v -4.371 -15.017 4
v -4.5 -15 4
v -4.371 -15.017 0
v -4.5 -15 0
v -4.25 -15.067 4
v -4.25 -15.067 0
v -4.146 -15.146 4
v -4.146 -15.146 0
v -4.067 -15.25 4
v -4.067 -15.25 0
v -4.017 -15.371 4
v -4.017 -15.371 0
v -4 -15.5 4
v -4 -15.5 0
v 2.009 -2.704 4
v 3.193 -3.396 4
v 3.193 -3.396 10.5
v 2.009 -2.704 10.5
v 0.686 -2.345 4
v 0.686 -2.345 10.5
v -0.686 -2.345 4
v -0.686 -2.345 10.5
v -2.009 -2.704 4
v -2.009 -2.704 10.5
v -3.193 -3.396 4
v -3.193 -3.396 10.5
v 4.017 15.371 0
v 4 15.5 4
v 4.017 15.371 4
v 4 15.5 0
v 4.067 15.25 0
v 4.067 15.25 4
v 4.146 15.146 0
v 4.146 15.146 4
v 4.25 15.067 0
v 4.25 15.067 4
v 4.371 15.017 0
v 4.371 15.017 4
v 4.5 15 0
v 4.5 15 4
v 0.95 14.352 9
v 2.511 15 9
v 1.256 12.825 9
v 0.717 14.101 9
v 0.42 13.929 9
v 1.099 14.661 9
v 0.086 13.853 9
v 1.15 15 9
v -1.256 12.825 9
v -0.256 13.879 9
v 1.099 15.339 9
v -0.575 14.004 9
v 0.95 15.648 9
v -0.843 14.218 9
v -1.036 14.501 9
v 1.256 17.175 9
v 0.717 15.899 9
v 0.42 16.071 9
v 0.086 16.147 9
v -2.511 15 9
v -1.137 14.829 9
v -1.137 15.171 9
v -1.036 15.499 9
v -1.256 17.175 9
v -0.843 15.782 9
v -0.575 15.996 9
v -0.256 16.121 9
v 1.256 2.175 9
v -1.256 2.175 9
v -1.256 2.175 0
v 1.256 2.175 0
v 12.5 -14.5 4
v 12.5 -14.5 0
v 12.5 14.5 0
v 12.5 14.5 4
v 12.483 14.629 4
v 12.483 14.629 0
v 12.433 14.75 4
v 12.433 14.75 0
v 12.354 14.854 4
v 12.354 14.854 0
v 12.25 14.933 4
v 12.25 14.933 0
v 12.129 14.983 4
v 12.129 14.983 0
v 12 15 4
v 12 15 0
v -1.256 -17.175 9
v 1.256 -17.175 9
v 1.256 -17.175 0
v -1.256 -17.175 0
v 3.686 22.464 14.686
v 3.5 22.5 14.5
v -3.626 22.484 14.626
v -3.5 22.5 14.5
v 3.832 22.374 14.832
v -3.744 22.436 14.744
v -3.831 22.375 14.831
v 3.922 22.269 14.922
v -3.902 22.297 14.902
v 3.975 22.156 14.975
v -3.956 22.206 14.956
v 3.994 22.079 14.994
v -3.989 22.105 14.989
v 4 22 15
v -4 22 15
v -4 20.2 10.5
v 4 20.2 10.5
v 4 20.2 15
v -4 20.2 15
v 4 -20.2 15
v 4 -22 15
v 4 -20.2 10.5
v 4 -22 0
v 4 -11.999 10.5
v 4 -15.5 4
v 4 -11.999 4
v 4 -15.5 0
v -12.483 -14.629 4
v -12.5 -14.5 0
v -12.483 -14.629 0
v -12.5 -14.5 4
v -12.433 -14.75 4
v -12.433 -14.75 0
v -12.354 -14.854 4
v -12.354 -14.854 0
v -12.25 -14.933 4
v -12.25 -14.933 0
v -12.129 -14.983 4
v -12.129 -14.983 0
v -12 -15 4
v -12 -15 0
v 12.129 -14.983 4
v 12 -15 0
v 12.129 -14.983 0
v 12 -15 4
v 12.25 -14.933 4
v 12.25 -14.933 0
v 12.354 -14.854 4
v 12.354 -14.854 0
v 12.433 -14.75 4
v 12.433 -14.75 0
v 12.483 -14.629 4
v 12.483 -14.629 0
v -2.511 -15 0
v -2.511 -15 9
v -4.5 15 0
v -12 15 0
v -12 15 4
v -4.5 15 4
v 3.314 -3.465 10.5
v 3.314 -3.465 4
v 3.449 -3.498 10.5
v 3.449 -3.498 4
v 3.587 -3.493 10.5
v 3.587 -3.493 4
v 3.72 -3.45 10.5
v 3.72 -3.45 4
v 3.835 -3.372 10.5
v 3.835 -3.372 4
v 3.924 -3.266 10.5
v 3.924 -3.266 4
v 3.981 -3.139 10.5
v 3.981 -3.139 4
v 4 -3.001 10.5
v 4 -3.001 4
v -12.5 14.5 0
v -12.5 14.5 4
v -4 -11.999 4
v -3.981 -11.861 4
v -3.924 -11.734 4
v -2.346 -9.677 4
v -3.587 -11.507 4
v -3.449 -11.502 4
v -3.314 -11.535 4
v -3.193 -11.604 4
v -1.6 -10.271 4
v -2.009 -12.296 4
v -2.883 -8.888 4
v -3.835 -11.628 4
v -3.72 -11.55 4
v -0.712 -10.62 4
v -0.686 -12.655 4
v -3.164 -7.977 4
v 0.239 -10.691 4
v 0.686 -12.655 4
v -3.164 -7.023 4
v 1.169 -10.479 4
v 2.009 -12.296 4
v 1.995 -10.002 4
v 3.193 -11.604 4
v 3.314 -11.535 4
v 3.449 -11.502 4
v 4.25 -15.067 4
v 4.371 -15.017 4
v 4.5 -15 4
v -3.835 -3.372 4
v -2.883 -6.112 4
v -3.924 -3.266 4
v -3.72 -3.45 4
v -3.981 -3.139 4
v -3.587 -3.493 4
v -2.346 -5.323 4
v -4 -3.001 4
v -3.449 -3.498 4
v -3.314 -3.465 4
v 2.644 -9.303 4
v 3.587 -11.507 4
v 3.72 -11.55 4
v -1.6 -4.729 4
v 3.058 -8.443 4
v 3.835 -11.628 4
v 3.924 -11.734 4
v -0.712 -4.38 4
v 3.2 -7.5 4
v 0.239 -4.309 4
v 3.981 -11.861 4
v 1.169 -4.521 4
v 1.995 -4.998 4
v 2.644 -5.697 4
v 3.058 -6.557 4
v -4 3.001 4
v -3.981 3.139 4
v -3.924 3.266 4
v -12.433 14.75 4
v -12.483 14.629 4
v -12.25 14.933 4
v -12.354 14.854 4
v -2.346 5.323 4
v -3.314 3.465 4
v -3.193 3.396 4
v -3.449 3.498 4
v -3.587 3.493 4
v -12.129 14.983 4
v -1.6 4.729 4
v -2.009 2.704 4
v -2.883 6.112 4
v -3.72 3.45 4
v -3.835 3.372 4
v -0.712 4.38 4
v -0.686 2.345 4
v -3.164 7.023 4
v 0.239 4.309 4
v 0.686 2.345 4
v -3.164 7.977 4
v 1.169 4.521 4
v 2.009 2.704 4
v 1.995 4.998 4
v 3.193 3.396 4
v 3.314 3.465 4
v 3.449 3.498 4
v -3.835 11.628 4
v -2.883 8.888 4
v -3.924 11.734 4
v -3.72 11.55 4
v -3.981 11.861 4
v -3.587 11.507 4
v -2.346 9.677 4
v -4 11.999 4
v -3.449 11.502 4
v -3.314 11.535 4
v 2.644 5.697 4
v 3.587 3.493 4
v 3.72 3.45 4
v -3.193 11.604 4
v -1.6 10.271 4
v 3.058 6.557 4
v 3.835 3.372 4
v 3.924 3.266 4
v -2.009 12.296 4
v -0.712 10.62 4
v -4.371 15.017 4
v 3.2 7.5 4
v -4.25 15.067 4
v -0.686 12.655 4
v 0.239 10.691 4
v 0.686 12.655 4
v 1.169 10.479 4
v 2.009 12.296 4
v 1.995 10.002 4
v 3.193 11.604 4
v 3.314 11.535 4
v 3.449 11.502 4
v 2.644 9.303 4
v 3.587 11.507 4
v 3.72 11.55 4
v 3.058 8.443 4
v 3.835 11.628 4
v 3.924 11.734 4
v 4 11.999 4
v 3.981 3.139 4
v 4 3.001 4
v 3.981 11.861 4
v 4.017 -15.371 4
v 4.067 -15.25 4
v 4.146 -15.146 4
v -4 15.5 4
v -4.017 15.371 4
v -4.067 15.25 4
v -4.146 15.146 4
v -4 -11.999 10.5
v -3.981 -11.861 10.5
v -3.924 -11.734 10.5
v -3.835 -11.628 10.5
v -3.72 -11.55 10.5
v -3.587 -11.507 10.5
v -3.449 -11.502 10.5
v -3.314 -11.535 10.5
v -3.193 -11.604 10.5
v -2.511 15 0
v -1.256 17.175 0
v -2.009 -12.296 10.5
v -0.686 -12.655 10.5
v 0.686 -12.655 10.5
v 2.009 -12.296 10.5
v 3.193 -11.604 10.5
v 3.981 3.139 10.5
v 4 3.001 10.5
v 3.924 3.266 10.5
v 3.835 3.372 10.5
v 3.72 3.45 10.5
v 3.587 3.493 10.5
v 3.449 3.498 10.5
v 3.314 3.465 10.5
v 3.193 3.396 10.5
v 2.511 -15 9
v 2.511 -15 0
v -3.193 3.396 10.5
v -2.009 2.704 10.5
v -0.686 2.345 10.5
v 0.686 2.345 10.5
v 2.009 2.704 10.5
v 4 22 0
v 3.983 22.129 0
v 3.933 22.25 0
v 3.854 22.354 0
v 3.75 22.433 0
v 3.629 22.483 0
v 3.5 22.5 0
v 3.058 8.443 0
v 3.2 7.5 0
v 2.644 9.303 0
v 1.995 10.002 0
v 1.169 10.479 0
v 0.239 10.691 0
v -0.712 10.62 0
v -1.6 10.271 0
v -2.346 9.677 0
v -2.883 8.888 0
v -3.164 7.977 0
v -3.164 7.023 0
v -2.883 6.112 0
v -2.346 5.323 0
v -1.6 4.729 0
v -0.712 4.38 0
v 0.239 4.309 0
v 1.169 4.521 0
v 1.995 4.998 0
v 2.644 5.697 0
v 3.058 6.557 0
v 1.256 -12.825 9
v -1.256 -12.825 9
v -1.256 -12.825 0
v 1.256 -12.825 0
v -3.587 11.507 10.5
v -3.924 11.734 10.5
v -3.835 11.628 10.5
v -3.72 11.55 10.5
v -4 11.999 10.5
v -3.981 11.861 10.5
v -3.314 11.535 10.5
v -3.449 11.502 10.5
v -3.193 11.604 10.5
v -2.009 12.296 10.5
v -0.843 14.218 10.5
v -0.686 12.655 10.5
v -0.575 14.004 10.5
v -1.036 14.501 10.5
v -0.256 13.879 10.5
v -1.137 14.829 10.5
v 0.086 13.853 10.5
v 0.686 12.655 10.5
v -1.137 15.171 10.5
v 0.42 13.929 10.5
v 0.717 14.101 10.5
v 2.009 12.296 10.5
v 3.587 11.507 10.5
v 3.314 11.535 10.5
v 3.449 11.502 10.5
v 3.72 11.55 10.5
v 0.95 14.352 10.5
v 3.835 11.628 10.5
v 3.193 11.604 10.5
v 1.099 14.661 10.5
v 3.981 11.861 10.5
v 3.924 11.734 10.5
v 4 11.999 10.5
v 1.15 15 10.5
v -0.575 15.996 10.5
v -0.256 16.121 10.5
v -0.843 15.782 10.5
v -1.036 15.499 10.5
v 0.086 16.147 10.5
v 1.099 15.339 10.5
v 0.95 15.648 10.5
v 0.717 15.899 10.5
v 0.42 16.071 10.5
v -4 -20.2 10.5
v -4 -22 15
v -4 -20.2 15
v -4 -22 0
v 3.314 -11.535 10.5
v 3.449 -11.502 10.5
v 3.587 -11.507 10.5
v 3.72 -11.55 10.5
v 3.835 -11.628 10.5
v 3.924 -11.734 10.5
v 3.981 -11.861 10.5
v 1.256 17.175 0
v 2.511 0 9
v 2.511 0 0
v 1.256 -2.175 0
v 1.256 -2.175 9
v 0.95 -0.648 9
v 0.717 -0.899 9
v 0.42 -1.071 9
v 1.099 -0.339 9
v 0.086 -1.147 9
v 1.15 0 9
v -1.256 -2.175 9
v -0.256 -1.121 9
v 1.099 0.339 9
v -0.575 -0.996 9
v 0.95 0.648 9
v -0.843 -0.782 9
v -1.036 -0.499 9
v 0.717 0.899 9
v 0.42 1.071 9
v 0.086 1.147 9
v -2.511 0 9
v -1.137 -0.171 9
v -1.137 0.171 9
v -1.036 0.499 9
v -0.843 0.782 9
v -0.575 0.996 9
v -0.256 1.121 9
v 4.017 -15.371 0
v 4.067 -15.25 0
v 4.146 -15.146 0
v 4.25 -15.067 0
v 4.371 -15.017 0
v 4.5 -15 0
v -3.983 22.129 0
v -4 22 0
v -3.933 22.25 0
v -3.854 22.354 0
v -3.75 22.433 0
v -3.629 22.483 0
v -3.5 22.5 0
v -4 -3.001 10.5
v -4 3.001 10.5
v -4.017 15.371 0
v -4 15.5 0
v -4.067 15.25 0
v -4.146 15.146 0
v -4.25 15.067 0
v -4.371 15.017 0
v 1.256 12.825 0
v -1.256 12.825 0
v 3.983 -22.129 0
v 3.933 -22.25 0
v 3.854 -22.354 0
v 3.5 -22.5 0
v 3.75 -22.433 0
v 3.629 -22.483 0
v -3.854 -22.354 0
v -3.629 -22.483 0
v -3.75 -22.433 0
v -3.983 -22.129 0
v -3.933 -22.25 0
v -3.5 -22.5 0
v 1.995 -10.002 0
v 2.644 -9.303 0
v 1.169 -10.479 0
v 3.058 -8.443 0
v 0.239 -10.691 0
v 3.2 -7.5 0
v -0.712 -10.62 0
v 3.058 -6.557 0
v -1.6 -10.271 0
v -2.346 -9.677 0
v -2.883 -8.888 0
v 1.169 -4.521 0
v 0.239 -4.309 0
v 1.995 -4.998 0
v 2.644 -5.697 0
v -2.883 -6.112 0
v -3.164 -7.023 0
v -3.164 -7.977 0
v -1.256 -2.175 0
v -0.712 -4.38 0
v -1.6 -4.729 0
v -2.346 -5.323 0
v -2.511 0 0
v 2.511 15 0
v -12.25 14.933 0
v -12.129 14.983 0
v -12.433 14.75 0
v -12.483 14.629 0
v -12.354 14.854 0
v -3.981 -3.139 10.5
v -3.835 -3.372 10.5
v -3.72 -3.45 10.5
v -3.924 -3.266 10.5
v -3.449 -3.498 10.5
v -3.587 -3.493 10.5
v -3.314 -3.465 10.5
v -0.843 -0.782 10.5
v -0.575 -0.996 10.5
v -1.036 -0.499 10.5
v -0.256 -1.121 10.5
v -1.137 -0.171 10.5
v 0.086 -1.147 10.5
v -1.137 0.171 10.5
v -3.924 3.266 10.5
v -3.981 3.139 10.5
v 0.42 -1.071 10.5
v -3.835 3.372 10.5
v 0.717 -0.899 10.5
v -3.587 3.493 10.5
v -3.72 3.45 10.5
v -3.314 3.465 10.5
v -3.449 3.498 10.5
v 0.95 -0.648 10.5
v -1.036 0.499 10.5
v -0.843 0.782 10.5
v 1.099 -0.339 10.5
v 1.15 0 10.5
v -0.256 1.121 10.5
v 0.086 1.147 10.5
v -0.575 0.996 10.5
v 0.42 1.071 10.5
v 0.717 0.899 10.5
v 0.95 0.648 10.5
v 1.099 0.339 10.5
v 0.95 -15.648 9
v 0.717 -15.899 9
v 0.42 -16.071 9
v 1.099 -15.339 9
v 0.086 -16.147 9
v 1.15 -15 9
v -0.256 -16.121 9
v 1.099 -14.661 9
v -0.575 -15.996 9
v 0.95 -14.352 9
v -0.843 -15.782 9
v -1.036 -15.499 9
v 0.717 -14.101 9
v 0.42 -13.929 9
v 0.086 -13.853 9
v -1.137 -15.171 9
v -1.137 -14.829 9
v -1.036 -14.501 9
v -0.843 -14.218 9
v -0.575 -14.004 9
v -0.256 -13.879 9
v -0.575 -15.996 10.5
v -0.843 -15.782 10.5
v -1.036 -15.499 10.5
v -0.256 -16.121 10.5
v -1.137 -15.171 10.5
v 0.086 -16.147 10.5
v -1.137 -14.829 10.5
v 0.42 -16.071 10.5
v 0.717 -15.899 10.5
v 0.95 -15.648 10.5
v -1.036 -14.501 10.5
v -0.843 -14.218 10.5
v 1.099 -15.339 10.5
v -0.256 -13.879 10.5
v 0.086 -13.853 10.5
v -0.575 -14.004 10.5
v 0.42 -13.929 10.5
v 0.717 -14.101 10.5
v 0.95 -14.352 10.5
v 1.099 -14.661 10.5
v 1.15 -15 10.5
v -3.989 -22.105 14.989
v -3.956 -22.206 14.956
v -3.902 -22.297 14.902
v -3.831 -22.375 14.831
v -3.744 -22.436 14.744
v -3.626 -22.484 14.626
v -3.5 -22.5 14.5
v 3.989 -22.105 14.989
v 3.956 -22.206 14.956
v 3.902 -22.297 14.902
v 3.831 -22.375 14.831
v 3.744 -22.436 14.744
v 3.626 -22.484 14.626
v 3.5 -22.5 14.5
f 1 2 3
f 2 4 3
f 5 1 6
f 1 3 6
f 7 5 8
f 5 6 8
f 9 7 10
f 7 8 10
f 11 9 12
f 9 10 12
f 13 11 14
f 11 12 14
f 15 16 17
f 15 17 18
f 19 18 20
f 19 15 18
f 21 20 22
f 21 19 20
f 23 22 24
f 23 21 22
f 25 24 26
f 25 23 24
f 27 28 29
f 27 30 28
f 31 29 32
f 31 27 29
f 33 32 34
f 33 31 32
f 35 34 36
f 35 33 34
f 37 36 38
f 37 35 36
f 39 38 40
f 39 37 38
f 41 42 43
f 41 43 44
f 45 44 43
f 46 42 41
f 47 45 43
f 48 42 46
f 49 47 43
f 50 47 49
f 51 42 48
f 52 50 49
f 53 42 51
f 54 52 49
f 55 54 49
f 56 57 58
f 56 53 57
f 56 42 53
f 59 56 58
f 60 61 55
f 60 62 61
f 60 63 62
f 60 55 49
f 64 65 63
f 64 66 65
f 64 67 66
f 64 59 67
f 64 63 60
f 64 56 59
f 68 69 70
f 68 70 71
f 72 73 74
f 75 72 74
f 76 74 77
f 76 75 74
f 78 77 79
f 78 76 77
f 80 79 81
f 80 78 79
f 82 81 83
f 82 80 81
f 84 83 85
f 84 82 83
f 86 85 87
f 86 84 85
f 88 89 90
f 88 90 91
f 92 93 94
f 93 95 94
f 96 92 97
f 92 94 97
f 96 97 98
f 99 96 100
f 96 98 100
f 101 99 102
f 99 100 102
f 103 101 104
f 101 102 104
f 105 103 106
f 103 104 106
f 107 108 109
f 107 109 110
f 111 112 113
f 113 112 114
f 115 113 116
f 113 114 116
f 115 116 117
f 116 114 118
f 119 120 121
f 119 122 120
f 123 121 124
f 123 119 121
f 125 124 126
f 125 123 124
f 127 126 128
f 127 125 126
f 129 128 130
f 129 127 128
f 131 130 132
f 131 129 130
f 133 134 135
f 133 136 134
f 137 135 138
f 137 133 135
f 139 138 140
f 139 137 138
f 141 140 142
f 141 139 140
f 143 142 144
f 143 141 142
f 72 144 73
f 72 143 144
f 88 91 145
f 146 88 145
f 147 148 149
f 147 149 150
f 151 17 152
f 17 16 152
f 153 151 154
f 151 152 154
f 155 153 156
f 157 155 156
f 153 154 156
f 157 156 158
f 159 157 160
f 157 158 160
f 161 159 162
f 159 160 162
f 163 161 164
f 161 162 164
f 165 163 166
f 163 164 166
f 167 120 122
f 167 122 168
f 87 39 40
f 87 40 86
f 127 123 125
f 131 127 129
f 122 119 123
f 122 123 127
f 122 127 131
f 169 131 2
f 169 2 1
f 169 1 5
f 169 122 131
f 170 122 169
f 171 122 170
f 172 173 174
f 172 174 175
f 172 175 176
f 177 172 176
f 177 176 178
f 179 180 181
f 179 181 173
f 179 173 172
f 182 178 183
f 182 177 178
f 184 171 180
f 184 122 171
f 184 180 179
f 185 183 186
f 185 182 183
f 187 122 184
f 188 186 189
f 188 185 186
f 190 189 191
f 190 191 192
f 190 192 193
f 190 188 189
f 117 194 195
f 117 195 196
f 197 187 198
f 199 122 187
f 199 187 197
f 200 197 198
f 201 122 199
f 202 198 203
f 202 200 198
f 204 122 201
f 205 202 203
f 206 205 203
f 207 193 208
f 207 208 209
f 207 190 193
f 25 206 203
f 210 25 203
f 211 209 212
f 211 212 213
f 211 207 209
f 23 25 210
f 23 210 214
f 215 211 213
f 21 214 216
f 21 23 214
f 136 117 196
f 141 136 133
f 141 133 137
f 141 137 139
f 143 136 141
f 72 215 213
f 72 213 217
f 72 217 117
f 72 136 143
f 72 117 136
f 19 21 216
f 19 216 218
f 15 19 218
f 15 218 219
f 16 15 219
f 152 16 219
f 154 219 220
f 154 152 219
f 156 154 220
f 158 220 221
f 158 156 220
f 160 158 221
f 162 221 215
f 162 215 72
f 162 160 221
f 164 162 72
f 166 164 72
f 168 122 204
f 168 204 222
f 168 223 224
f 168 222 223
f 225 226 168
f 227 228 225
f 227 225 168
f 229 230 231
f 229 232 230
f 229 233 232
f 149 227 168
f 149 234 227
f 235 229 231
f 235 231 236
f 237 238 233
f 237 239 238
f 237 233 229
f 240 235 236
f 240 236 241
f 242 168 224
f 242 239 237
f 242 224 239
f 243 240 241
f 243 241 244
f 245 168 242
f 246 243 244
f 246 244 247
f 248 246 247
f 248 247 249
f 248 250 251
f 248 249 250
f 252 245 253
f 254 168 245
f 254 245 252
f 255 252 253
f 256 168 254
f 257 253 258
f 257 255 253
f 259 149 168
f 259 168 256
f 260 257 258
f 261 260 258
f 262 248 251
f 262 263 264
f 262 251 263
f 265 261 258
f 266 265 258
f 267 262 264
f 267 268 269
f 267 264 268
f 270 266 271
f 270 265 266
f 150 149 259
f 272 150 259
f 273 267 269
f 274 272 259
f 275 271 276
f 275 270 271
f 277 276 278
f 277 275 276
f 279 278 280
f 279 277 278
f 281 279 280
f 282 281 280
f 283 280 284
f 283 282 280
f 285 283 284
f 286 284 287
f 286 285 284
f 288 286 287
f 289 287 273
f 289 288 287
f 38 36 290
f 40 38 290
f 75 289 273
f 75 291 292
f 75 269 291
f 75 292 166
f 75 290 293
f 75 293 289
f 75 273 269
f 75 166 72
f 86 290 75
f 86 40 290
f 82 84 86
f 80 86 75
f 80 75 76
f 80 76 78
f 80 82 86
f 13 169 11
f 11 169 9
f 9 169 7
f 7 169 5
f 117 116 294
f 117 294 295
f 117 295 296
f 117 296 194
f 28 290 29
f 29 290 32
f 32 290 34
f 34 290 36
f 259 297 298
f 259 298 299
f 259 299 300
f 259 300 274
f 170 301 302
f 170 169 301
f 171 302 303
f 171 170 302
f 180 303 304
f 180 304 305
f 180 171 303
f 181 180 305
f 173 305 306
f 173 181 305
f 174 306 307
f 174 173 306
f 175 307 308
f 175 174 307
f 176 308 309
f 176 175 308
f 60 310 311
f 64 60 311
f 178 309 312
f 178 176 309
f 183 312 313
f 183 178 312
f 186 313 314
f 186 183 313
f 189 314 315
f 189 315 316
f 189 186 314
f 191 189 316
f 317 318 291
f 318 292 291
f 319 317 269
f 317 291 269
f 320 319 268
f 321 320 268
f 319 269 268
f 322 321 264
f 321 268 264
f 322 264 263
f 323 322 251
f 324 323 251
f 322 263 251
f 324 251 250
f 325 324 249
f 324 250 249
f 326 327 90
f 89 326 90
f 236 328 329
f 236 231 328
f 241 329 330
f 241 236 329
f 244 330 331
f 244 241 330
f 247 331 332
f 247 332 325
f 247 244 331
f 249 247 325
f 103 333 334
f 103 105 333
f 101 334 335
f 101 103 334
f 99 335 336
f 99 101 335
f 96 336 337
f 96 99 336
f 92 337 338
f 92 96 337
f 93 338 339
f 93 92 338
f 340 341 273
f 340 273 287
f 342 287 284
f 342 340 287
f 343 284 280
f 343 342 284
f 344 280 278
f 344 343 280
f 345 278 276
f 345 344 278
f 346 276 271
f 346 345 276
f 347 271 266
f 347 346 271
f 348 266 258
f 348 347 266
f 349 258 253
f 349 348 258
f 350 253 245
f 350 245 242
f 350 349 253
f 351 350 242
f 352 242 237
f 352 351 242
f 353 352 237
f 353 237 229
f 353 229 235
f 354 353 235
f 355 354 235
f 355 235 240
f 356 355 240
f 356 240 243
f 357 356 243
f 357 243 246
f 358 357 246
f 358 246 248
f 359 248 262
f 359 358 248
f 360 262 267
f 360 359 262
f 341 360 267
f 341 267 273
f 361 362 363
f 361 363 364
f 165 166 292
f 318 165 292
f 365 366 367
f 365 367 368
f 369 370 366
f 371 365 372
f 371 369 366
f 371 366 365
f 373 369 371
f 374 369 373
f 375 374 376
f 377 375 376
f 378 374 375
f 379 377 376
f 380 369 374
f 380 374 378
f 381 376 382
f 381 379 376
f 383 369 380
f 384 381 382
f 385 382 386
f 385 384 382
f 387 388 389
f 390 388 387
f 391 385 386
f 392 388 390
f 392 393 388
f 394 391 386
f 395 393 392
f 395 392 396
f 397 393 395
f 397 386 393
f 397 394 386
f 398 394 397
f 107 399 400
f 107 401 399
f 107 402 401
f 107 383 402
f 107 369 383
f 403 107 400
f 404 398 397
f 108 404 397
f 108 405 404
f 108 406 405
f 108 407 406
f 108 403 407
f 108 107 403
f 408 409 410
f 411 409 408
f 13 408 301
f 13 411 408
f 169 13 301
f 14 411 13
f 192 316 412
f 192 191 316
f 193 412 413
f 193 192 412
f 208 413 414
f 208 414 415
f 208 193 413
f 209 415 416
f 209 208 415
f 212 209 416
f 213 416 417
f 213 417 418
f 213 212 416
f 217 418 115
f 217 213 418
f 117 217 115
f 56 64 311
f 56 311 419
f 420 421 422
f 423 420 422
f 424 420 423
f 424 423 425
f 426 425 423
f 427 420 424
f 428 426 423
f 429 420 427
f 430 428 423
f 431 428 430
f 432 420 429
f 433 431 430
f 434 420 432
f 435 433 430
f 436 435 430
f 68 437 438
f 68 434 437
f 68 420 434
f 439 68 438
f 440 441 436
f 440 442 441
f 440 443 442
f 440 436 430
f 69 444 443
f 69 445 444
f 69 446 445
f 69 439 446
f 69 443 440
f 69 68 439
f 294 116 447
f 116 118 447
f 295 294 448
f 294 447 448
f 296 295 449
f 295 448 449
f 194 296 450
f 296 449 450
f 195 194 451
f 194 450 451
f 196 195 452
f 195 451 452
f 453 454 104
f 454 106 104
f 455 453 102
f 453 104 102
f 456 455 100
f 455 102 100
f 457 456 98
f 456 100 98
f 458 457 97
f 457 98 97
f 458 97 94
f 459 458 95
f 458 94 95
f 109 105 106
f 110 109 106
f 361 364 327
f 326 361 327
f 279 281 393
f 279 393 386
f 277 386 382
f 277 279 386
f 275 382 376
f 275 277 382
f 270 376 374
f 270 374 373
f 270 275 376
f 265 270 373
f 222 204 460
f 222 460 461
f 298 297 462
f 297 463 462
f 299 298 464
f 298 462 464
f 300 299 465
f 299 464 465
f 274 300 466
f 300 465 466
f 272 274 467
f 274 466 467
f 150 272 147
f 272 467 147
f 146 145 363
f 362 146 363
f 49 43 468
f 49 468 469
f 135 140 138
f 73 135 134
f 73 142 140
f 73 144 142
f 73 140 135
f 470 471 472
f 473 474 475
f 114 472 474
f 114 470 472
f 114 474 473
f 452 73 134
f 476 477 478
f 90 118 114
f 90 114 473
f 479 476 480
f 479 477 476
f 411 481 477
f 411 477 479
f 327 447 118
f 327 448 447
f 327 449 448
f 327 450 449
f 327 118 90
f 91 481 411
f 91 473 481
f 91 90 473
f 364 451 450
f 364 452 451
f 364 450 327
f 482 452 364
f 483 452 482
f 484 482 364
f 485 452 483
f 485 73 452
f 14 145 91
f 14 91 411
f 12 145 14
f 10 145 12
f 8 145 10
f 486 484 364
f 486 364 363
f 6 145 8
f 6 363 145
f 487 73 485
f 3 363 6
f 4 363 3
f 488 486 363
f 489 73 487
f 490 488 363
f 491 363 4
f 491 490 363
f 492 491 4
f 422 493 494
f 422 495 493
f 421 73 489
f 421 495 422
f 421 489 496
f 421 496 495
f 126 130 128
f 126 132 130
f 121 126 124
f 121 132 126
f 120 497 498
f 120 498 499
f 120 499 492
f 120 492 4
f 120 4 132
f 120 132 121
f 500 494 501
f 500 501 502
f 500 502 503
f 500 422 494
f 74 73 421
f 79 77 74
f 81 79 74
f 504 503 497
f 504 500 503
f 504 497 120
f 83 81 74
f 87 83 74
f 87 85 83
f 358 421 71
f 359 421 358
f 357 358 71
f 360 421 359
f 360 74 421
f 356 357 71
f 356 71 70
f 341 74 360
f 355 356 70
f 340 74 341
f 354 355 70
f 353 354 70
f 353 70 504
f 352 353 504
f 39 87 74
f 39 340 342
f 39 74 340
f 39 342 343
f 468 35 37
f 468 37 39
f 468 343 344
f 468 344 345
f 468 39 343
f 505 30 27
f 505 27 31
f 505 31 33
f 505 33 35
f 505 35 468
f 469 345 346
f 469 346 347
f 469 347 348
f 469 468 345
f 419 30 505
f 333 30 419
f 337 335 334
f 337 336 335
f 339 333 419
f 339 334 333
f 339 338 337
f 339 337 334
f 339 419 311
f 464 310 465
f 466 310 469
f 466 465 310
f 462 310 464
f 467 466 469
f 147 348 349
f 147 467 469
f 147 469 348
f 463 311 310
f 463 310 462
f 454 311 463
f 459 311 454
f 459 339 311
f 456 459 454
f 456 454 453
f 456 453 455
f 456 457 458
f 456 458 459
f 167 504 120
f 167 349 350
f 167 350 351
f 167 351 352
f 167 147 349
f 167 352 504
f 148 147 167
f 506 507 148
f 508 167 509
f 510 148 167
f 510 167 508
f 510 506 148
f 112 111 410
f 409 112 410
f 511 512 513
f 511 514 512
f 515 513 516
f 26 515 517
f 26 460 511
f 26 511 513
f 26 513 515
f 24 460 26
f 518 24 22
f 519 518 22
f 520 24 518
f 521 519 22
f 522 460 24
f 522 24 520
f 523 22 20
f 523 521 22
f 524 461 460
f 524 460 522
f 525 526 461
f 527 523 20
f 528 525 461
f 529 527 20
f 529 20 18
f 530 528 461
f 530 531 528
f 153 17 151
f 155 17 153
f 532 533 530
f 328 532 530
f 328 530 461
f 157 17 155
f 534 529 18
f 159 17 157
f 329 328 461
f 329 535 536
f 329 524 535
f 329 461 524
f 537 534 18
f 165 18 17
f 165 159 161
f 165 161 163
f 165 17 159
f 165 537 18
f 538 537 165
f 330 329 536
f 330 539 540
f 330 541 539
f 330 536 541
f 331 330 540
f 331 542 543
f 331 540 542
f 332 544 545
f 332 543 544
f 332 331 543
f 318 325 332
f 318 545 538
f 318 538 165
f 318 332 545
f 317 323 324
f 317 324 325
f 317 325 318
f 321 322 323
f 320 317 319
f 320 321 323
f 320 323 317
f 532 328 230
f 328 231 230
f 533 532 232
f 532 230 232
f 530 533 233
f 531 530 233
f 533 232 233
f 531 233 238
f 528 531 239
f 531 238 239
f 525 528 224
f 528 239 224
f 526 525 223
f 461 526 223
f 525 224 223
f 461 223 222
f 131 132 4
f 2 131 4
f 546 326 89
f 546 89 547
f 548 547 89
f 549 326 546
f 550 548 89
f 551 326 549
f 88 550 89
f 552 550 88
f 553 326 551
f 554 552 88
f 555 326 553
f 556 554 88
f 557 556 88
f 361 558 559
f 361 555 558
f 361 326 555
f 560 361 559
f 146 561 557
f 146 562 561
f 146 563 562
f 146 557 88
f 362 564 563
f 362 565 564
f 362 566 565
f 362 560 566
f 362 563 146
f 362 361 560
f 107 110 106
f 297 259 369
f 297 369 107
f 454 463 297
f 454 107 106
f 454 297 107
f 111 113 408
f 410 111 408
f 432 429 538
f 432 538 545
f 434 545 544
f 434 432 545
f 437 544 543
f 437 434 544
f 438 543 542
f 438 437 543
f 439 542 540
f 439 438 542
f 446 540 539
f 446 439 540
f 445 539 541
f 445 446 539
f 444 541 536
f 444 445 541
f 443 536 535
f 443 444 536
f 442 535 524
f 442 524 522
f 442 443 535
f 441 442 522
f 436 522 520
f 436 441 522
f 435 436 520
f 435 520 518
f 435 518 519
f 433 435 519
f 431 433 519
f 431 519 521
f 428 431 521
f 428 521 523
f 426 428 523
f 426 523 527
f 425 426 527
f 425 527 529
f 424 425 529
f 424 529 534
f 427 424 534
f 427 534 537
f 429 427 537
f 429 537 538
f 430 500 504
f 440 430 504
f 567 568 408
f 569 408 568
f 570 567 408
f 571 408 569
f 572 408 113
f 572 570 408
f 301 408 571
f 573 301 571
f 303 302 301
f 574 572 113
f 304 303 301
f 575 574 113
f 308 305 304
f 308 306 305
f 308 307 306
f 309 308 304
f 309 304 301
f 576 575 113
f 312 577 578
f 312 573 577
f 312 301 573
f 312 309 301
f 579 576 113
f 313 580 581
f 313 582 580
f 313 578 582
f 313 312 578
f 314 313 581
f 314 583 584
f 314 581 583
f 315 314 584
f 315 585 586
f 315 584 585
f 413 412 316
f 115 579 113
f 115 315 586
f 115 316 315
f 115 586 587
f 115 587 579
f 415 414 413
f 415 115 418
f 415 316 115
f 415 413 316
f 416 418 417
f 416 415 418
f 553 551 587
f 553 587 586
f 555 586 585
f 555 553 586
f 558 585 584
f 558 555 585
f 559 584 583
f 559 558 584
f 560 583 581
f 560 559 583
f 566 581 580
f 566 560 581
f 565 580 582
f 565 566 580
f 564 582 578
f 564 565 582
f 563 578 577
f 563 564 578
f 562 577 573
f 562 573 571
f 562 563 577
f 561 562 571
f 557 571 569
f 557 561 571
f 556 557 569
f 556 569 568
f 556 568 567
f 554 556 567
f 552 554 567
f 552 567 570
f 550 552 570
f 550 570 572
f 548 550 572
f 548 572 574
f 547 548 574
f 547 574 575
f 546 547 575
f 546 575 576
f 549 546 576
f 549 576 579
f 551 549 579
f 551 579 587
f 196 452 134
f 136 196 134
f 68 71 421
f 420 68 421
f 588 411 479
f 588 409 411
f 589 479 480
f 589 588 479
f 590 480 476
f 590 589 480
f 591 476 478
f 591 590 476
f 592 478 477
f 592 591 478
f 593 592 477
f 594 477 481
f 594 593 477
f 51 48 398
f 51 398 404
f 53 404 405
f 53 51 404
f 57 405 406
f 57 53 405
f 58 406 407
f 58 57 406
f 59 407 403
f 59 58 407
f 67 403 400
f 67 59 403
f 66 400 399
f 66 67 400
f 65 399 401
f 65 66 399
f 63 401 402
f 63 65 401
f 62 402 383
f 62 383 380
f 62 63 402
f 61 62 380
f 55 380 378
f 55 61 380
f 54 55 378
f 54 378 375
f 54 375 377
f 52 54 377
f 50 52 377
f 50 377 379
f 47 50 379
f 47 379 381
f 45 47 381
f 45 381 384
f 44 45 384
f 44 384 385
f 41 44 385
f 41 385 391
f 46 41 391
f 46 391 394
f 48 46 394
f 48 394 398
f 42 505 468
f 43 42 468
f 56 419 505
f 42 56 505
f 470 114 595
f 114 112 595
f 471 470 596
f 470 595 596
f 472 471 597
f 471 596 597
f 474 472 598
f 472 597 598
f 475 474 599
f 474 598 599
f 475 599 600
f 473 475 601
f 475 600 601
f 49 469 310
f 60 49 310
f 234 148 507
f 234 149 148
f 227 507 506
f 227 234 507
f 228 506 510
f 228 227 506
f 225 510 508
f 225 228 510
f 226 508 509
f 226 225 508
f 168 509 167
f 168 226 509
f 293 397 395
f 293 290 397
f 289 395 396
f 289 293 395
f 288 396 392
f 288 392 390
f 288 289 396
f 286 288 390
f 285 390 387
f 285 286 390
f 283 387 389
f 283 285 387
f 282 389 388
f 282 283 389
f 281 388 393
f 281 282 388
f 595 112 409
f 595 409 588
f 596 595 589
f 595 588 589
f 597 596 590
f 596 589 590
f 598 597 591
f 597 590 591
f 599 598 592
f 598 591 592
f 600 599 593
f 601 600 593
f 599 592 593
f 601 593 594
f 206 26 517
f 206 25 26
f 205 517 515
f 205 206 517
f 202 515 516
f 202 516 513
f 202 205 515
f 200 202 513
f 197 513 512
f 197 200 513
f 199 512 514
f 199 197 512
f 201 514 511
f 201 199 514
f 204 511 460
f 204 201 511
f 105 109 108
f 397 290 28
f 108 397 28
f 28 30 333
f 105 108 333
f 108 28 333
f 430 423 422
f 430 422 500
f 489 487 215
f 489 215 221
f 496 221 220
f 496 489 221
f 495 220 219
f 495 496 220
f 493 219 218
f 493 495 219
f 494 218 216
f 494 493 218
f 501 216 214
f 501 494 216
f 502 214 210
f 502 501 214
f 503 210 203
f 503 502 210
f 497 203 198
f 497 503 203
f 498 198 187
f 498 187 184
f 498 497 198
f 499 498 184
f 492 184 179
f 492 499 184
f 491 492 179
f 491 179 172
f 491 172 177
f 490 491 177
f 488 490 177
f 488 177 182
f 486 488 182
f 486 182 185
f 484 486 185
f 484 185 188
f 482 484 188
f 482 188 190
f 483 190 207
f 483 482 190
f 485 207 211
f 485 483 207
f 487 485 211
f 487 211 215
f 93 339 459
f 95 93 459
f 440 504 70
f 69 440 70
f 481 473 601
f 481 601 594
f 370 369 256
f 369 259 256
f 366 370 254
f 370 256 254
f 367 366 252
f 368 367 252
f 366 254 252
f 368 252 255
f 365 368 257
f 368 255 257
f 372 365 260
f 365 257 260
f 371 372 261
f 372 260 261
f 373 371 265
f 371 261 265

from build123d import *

# Parameters (mm, degrees)
SKETCH_1_W          = 25
SKETCH_1_H          = 30
SKETCH_1_R          = 3.2
EXTRUDE_1_DEPTH     = 4
SKETCH_2_W          = 8
SKETCH_2_H          = 40.4
SKETCH_2_R          = 1.15
EXTRUDE_2_DEPTH     = 6.5
SKETCH_5_R          = 5.2
CUT_EXTRUDE_1_DEPTH = 6.5
SKETCH_6_W          = 8
SKETCH_6_H          = 5.2
EXTRUDE_4_DEPTH     = 4
CUT_EXTRUDE_2_DEPTH = 9
SKETCH_8_W          = 8
SKETCH_8_H          = 2.3
EXTRUDE_5_DEPTH     = 15
FILLET_2_R          = 0.5


with BuildPart() as part:
    # 스케치1 → 보스-돌출1 (new body)
    with BuildSketch(Plane.XY):
        Rectangle(SKETCH_1_W, SKETCH_1_H)
        with Locations((0, 7.5)):
            Circle(SKETCH_1_R, mode=Mode.SUBTRACT)
        with Locations((0, -7.5)):
            Circle(SKETCH_1_R, mode=Mode.SUBTRACT)
    extrude(amount=EXTRUDE_1_DEPTH)

    # 스케치2 → 보스-돌출2 (add)
    with BuildSketch(Plane.XY.offset(4)):
        Rectangle(SKETCH_2_W, SKETCH_2_H)
        Circle(SKETCH_2_R, mode=Mode.SUBTRACT)
        with Locations((0, 15)):
            Circle(SKETCH_2_R, mode=Mode.SUBTRACT)
        with Locations((0, -15)):
            Circle(SKETCH_2_R, mode=Mode.SUBTRACT)
    extrude(amount=EXTRUDE_2_DEPTH)

    # 스케치5 → 컷-돌출1 (cut)
    with BuildSketch(Plane.XY.offset(4)):
        with Locations((0, 7.5)):
            Circle(SKETCH_5_R)
        with Locations((0, -7.5)):
            Circle(SKETCH_5_R)
    extrude(amount=CUT_EXTRUDE_1_DEPTH, mode=Mode.SUBTRACT)

    # 스케치6 → 보스-돌출4 (add)
    with BuildSketch(Plane(origin=(0, 0, 4), x_dir=(-1, 0, 0), z_dir=(0, 0, -1))):
        with Locations((0, 17.6)):
            Rectangle(SKETCH_6_W, SKETCH_6_H)
        with Locations((0, -17.6)):
            Rectangle(SKETCH_6_W, SKETCH_6_H)
    extrude(amount=EXTRUDE_4_DEPTH)

    # 스케치7 → 컷-돌출2 (cut)
    with BuildSketch(Plane(origin=(0, 0, 0), x_dir=(-1, 0, 0), z_dir=(0, 0, -1))):
        Polygon((2.511473671, 15), (1.255736835, 17.175), (-1.255736835, 17.175), (-2.511473671, 15), (-1.255736835, 12.825), (1.255736835, 12.825), align=None)
        Polygon((2.511473671, 0), (1.255736835, 2.175), (-1.255736835, 2.175), (-2.511473671, 0), (-1.255736835, -2.175), (1.255736835, -2.175), align=None)
        Polygon((2.511473671, -15), (1.255736835, -12.825), (-1.255736835, -12.825), (-2.511473671, -15), (-1.255736835, -17.175), (1.255736835, -17.175), align=None)
    extrude(amount=-CUT_EXTRUDE_2_DEPTH, mode=Mode.SUBTRACT)

    # 스케치8 → 보스-돌출5 (add)
    with BuildSketch(Plane(origin=(0, 0, 0), x_dir=(-1, 0, 0), z_dir=(0, 0, -1))):
        with Locations((0, 21.35)):
            Rectangle(SKETCH_8_W, SKETCH_8_H)
        with Locations((0, -21.35)):
            Rectangle(SKETCH_8_W, SKETCH_8_H)
    extrude(amount=-EXTRUDE_5_DEPTH)

    # 필렛2
    fillet_2_edges = [part.edges().sort_by_distance(p)[0] for p in [
        (4, -15, 2),
        (-4, -15, 2),
        (-4, 22.5, 7.5),
        (0, 22.5, 15),
        (4, 22.5, 7.5),
        (0, -22.5, 15),
        (-4, -22.5, 7.5),
        (4, -22.5, 7.5),
        (-4, 4.177350455, 7.25),
        (-4, 10.822649545, 7.25),
        (4, 10.822649545, 7.25),
        (4, 4.177350455, 7.25),
        (-12.5, 15, 2),
        (12.5, 15, 2),
        (-4, -10.822649545, 7.25),
        (-4, -4.177350455, 7.25),
        (12.5, -15, 2),
        (4, -4.177350455, 7.25),
        (4, -10.822649545, 7.25),
        (-12.5, -15, 2),
        (-4, 15, 2),
        (4, 15, 2),
    ]]
    fillet(fillet_2_edges, radius=FILLET_2_R)


solid = part.part
